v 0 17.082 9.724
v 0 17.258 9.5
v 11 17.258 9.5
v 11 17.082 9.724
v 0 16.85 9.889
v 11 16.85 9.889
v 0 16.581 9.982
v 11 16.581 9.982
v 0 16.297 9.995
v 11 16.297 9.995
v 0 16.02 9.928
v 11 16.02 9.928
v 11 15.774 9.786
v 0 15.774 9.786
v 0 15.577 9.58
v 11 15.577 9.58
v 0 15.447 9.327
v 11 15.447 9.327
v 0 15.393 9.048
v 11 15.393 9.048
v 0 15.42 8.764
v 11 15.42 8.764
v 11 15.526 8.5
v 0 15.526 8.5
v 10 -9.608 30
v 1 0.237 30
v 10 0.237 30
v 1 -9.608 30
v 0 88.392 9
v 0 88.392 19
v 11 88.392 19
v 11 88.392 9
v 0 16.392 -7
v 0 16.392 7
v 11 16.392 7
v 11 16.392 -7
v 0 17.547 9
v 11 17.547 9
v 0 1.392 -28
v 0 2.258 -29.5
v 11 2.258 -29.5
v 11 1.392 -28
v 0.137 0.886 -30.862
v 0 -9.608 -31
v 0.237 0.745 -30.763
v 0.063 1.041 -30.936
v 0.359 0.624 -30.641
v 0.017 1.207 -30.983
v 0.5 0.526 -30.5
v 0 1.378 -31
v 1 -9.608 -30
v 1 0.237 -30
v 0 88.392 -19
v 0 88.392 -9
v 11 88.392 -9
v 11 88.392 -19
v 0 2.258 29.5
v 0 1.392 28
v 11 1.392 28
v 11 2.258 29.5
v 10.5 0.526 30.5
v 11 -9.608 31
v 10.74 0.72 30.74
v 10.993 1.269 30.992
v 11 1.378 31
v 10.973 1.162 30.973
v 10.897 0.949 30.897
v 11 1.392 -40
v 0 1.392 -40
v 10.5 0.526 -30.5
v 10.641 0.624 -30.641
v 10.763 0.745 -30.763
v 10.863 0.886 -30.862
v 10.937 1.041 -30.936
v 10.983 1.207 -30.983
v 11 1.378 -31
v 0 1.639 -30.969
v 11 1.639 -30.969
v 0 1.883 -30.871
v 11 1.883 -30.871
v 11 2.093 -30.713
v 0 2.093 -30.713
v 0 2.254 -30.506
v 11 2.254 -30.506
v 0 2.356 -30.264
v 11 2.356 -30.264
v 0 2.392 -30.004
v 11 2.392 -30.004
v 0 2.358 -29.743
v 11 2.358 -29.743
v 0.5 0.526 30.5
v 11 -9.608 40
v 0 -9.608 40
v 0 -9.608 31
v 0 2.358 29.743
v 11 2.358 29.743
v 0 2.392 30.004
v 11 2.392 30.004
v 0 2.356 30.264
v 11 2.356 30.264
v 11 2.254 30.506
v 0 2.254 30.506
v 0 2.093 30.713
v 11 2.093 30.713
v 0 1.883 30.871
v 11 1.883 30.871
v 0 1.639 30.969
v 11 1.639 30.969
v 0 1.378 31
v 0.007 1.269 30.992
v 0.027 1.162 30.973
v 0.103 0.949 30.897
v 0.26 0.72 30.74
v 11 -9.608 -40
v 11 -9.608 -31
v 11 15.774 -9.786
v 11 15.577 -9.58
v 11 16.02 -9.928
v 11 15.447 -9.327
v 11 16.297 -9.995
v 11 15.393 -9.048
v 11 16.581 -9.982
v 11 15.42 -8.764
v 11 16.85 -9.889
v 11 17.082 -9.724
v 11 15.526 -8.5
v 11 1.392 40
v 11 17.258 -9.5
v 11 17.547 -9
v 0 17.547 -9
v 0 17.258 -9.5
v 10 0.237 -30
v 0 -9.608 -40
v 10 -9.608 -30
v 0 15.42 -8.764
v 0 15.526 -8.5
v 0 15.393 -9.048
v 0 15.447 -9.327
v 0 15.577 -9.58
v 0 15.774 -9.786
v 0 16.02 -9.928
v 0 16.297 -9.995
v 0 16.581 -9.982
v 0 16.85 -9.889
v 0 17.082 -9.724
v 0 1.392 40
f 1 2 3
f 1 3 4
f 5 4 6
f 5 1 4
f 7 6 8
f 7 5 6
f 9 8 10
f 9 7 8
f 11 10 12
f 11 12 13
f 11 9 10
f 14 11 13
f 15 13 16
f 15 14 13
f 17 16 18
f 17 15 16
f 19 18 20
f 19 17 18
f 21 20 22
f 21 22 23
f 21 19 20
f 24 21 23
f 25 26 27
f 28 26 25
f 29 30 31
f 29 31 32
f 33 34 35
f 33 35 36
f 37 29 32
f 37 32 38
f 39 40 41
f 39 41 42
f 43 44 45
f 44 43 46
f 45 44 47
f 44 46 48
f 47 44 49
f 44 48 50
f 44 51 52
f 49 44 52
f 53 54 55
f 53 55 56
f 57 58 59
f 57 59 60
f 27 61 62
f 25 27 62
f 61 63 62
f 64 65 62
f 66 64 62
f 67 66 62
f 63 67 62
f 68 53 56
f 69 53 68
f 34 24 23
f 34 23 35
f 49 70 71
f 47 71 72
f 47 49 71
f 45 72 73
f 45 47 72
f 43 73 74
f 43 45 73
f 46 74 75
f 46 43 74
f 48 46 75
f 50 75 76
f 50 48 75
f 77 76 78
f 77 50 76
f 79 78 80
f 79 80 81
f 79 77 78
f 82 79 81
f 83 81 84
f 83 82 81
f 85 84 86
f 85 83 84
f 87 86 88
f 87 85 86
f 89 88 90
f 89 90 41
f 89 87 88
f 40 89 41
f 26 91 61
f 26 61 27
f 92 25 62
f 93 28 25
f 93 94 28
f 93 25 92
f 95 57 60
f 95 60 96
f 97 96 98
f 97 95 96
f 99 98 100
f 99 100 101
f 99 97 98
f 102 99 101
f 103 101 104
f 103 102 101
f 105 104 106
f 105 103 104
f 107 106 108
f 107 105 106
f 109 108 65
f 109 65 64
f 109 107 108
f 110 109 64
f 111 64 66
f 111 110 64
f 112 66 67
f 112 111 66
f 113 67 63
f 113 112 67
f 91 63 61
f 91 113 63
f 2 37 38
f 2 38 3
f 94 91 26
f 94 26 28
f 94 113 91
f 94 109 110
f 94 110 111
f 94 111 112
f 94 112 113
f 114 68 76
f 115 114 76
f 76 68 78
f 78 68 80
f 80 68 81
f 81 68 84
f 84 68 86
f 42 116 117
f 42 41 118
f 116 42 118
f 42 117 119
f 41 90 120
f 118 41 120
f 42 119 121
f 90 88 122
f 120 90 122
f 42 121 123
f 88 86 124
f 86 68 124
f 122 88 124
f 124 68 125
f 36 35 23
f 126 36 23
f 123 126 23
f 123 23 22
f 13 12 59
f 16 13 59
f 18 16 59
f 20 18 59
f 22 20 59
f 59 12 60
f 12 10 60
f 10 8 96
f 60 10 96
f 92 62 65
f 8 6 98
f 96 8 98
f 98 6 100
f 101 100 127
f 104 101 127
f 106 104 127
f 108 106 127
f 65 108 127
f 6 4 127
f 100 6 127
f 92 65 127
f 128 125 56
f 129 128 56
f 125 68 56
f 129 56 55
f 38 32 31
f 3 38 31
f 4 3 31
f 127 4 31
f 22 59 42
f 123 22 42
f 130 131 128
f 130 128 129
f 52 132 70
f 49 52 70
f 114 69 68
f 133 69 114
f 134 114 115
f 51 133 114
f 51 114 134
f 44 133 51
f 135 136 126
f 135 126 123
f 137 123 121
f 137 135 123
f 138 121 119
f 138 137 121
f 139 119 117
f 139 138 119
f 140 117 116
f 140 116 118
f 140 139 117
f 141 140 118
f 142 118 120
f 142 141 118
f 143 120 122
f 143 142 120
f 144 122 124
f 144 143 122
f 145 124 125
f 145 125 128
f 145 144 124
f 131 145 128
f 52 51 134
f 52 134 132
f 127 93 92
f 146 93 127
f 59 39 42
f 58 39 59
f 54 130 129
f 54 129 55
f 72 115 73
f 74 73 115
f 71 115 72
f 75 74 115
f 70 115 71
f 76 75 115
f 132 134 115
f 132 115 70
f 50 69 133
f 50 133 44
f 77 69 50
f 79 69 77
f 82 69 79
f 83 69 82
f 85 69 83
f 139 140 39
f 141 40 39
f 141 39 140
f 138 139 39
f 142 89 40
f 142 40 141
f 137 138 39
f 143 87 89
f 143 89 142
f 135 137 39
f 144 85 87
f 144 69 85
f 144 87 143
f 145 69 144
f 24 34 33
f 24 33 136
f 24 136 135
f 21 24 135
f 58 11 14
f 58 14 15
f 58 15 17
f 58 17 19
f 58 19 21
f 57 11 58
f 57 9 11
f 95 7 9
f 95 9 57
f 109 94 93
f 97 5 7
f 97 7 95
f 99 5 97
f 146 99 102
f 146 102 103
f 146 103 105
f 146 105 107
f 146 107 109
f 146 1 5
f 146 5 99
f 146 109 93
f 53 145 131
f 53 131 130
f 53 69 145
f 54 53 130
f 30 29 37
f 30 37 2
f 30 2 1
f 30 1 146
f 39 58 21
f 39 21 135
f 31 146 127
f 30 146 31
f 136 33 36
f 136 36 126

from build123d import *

# Parameters (mm, degrees)
BOSS_EXTRUDE1_DEPTH = 11
CHAMFER4_SIZE       = 1
CHAMFER5_SIZE       = 1


with BuildPart() as part:
    # Sketch1 → Boss-Extrude1 (new body)
    with BuildSketch(Plane(origin=(0, 0, 0), x_dir=(0, 0, -1), z_dir=(1, 0, 0))):
        with BuildLine():
            Line((28, 1.391885412), (-28, 1.391885412))
            Line((-28, 1.391885412), (-29.5, 2.257910816))
            ThreePointArc((-29.5, 2.257910816), (-30.866025404, 1.891885412), (-30.5, 0.525860008))
            Line((-30.5, 0.525860008), (-30, 0.237184874))
            Line((-30, 0.237184874), (-30, -9.608114588))
            Line((-30, -9.608114588), (-40, -9.608114588))
            Line((-40, -9.608114588), (-40, 1.391885412))
            Line((-40, 1.391885412), (-19, 88.391885412))
            Line((-19, 88.391885412), (-9, 88.391885412))
            Line((-9, 88.391885412), (-9, 17.54658595))
            Line((-9, 17.54658595), (-9.5, 17.257910816))
            ThreePointArc((-9.5, 17.257910816), (-9.866025404, 15.891885412), (-8.5, 15.525860008))
            Line((-8.5, 15.525860008), (-7, 16.391885412))
            Line((-7, 16.391885412), (7, 16.391885412))
            Line((7, 16.391885412), (8.5, 15.525860008))
            ThreePointArc((8.5, 15.525860008), (9.866025404, 15.891885412), (9.5, 17.257910816))
            Line((9.5, 17.257910816), (9, 17.54658595))
            Line((9, 17.54658595), (9, 88.391885412))
            Line((9, 88.391885412), (19, 88.391885412))
            Line((19, 88.391885412), (40, 1.391885412))
            Line((40, 1.391885412), (40, -9.608114588))
            Line((40, -9.608114588), (30, -9.608114588))
            Line((30, -9.608114588), (30, 0.237184874))
            Line((30, 0.237184874), (30.5, 0.525860008))
            ThreePointArc((30.5, 0.525860008), (30.866025404, 1.891885412), (29.5, 2.257910816))
            Line((29.5, 2.257910816), (28, 1.391885412))
        make_face()
    extrude(amount=BOSS_EXTRUDE1_DEPTH)

    # Chamfer4
    chamfer4_edges = [part.edges().sort_by_distance(p)[0] for p in [
        (0, -4.685464857, 30),
        (11, -4.685464857, 30),
    ]]
    chamfer(chamfer4_edges, length=CHAMFER4_SIZE - 0.0001)  # a hair under: the kernel refuses the full size

    # Chamfer5
    chamfer5_edges = [part.edges().sort_by_distance(p)[0] for p in [
        (0, -4.685464857, -30),
        (11, -4.685464857, -30),
    ]]
    chamfer(chamfer5_edges, length=CHAMFER5_SIZE - 0.0001)  # a hair under: the kernel refuses the full size


solid = part.part
